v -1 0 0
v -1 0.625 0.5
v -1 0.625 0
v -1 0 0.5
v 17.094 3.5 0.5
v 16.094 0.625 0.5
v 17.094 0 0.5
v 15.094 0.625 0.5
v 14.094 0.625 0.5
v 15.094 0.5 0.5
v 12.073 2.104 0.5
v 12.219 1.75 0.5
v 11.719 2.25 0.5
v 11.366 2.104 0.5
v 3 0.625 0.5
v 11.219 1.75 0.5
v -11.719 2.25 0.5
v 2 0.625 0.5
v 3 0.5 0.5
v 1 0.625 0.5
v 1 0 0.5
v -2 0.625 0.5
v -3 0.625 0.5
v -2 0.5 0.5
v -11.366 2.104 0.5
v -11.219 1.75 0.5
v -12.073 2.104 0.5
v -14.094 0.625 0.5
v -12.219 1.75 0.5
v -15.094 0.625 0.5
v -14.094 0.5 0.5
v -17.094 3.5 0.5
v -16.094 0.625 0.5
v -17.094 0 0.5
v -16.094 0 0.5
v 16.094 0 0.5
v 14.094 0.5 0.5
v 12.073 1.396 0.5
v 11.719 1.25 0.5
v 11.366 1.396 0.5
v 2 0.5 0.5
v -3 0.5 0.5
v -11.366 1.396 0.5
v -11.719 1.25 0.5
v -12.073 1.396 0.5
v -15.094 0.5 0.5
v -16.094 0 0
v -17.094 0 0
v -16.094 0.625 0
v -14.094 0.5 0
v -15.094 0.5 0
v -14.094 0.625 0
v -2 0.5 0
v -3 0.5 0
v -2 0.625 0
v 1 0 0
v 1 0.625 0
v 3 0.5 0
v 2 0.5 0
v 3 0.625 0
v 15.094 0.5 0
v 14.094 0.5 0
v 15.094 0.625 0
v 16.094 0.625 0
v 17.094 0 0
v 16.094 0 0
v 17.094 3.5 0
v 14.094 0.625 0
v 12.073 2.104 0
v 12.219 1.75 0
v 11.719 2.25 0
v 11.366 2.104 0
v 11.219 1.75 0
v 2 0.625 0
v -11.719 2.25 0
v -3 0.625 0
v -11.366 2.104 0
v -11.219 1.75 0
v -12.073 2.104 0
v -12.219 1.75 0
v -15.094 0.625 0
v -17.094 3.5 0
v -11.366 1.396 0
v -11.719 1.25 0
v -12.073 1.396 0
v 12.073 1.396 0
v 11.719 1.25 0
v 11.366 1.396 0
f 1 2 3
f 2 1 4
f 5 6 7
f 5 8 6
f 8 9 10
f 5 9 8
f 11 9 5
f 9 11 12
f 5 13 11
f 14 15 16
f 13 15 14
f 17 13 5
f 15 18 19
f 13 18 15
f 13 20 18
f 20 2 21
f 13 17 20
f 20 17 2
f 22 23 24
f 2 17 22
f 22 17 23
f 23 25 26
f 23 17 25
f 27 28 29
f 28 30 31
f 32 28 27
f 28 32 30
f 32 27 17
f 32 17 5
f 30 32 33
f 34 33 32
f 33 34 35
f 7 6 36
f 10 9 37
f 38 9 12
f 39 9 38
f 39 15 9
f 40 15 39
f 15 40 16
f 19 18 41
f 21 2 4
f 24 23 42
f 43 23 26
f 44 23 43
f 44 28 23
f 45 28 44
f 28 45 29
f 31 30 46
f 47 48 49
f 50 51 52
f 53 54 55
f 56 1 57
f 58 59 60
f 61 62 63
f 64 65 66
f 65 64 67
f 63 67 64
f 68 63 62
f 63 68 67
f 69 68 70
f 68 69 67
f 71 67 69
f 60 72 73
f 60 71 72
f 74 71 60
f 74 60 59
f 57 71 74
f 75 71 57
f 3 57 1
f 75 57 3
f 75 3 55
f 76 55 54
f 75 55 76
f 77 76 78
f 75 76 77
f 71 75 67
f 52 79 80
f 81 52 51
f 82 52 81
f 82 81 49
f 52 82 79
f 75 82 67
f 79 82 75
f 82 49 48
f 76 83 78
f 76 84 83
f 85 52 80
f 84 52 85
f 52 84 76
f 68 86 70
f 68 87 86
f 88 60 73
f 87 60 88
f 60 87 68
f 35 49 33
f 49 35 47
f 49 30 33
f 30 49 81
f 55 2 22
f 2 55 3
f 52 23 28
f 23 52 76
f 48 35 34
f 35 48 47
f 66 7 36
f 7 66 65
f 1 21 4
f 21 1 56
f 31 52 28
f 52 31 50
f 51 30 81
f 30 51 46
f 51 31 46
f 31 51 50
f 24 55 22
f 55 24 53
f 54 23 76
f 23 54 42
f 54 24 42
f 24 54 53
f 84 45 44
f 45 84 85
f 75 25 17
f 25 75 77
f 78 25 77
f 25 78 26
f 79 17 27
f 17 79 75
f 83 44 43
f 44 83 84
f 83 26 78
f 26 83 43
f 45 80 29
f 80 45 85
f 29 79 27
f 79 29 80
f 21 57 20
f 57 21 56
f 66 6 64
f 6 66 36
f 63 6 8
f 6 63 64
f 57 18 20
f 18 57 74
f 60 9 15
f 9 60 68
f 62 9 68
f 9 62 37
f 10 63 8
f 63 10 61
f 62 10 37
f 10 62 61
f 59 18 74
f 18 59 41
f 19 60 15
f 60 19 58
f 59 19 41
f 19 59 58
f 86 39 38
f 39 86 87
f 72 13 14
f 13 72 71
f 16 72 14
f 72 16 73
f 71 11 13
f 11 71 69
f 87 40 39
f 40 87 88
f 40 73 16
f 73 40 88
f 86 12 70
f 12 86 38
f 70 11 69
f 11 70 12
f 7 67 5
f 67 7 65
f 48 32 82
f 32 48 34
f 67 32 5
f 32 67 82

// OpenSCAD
// file: modus.scad
//Corner Joint - allows the sides of two parts to create inlayed corner. Aids with welding.
//need to verify module math is the same throughout all parts.

module cornerjoint(Z,L,H,EndGap,PadL,PadH,CJangle,CJcenter){
    //change so that H = Z of inlayed part (usually 0.5)
    //add center and angle in degrees option, orgin far side of cut out area

     if((CJangle==0)&&(CJcenter==0))
      {    
        translate([0,0,0])
        rotate([0,0,CJangle])
        difference(){
        cube([L,H+PadH,Z]);
        translate([EndGap,H,0])
        cube([PadL,PadH,Z]);
        translate([L-EndGap-PadL,H,0])
        cube([PadL,PadH,Z]);}
      }    
else if((CJangle==90)&&(CJcenter==0))
      {    
        translate([H+PadH,0,0])
        rotate([0,0,CJangle])
        difference(){
        cube([L,H+PadH,Z]);
        translate([EndGap,H,0])
        cube([PadL,PadH,Z]);
        translate([L-EndGap-PadL,H,0])
        cube([PadL,PadH,Z]);}
      }
else if((CJangle==180)&&(CJcenter==0))       
      {    
        translate([L,H+PadH,0])
        rotate([0,0,CJangle])
        difference(){
        cube([L,H+PadH,Z]);
        translate([EndGap,H,0])
        cube([PadL,PadH,Z]);
        translate([L-EndGap-PadL,H,0])
        cube([PadL,PadH,Z]);}
      }
else if((CJangle==270)&&(CJcenter==0))
      {    
        translate([0,L,0])
        rotate([0,0,CJangle])
        difference(){
        cube([L,H+PadH,Z]);
        translate([EndGap,H,0])
        cube([PadL,PadH,Z]);
        translate([L-EndGap-PadL,H,0])
        cube([PadL,PadH,Z]);}
      }  
      
//centered     
   
else if((CJangle==0)&&(CJcenter==1))
      {    
        translate([-L/2,0,0])
        rotate([0,0,CJangle])
        difference(){
        cube([L,H+PadH,Z]);
        translate([EndGap,H,0])
        cube([PadL,PadH,Z]);
        translate([L-EndGap-PadL,H,0])
        cube([PadL,PadH,Z]);}
      }  
else if((CJangle==90)&&(CJcenter==1))
      {    
        translate([0,-L/2,0])
        rotate([0,0,CJangle])
        difference(){
        cube([L,H+PadH,Z]);
        translate([EndGap,H,0])
        cube([PadL,PadH,Z]);
        translate([L-EndGap-PadL,H,0])
        cube([PadL,PadH,Z]);}
      }
else if((CJangle==180)&&(CJcenter==1))       
      {    
        translate([L/2,0,0])
        rotate([0,0,CJangle])
        difference(){
        cube([L,H+PadH,Z]);
        translate([EndGap,H,0])
        cube([PadL,PadH,Z]);
        translate([L-EndGap-PadL,H,0])
        cube([PadL,PadH,Z]);}
      }
else if((CJangle==270)&&(CJcenter==1))
      {    
        translate([0,L/2,0])
        rotate([0,0,CJangle])
        difference(){
        cube([L,H+PadH,Z]);
        translate([EndGap,H,0])
        cube([PadL,PadH,Z]);
        translate([L-EndGap-PadL,H,0])
        cube([PadL,PadH,Z]);}
      }
} //end cornerjoint module

//Tab Insert - used to cut a hole for an abutting part to insert into. Typically aids with welding the two parts.
module tabinsert(X,Y,Z,dGap,cGap,c1,c2,c3,c4,c5,c6,c7,c8,center){
    translate([-dGap-(center*(X/2)),-dGap-(center*(Y/2)),0]){
        //main cut
        cube([X+(dGap*2),Y+(dGap*2),Z]);
        //corner c1c2
        translate([-cGap,(Y+(dGap*2))-c1+cGap,0])
            {
        cube([c2,c1,Z]);}
       //corner c3c4
       translate([(X+(dGap*2))-c3+cGap,(Y+(dGap*2))-c4+cGap,0]){
           cube([c3,c4,Z]);
       }
       //corner c5c6
       translate([(X+(dGap*2))-c6+cGap,-cGap,0])
      {
          cube([c6,c5,Z]);
      }
       
       //corner c7c8 
       translate([-cGap,-cGap,0]){
           cube([c7,c8,Z]);
       }
    
    } //end center translate
} //end tabinsert module
 

module nut(flattoflat,nutheight){  //distance from one flat side to the other flat side "A/F"

//typical sizes found here:
//https://en.wikipedia.org/wiki/Nut_(hardware)

difference(){
    translate([0,0,nutheight/2])
cube(size = [10,10,nutheight], center = true);
    
for(i=[1:6]){
    rotate([0,0,i*60])
difference(){
    translate([-10,0,0])
    cube([20,20,nutheight]);
    translate([-10,0,0])
    cube([20,flattoflat/2,nutheight]);
}  //end difference
}  //end for
}  //end differeence
}  //end module
// file: vars.scad
brickW=6; 
brickL=24;
brickCH=6; //Is brick height being shortened by d1z??

//3.625 x 2.25 x 8
//6 x 12 x 6

grateX=56;
grateY=23;
grateH=37; //Height mounted above press's frame
grateA=17.5; //angle of grate

//grateX=56;
//grateY=23;
//grateH=37; //Height mounted above press's frame
//grateA=17.5; //angle of grate


$fn=8; //defines resolution of circles. 8 is okay for review. 100  or greater should be used for for final dxf export.

dZstandard=0.5; //thickness of steel to be cut for drawer parts
fZstandard=0.5;
aZstandard=0.5; //thickness of steel to be cut for arm parts
hZstandard=0.125;

fBOLTHOLEstandardD=1; //standard bolts used on frame
aBOLTHOLEstandardD=1;

sliderodholeOD=1.2; 
d1bushingOD=1.25;
d1bushingL=1.25;
d1shaftOD=1;
d1bolt1OD=1;
d1bolt2OD=0.75;
d1nut2AF=1.25;
d1nut2H=0.665;


dGap=0.03125; //gap between a hole cut's edge and the part sitting within the hole. //D3 appears to use 0.3125, is this in error?

//all parts set to standard thickness below
//off standard preferences can be defined below

//drawer
drawergap=0.0283;  //extra room for drawer to slide in the space between f1 and f4
drawerHgap=0.1884;  //total extra space from drawer sides to frame walls. sum of both sides.

d2clevispinaccessholeOD=3;

d1z=dZstandard;
d2z=dZstandard;
d3z=dZstandard;
d4z=dZstandard;
d5z=dZstandard;
d6z=dZstandard;
d5z=dZstandard;
d7z=dZstandard;
d8z=dZstandard;
d9z=dZstandard;

d11z=dZstandard;
d12z=dZstandard;


//frame

f1y=6;
f1z=fZstandard;


f2y=3.5;
f2z=fZstandard;

f3y=3.5;
f3z=fZstandard;

f4y=11;
f4z=fZstandard;

f5y=3.5;
f5z=fZstandard;

f6y=8;
f6z=fZstandard;

f8y=brickW;
f8z=fZstandard;
f8boltD=1;

f9y=4.5;

f9z=fZstandard;




f12z=fZstandard;   

f11x=1.25;
f11z=fZstandard;

f13z=fZstandard;

f14y=3.5;
f14z=fZstandard;

//arms

a1x=4;
a1z=aZstandard;
a1out=24; //length from frame to A5 edge for bricks to sit on as they exit

a2x=6;
a2z=aZstandard;

a3x=4;
a3y=72;
a3z=aZstandard;

a4x=6;
a4y=72;
a4z=aZstandard;

a5x=6;
a5y=72;
a5z=aZstandard;

a6z=aZstandard;

//guards

h1x=grateX;
h1y=grateH;  //might need to tweak for grate thickness

h1z=hZstandard;
h2z=hZstandard;
h3z=hZstandard;
h4z=hZstandard;
h5z=hZstandard;
h6z=hZstandard;
h7z=hZstandard;
h8z=hZstandard;

//
//Input your main cylinder's dimenions here
//
cylMainBore = 5;
cylMainStroke = 16;
cylMainExt = 43;
cylMainRet = 27;
cylMainA = (cylMainRet-cylMainStroke); //center to center minus stroke length
cylMainB = 0.25; // cylinder wall thickness
cylMainD = 2.5; //Rod OD
cylMainE = 5.75; //rear pin holder width
cylMainG = 4; //rod pin holder width
cylMainJ = 3.8; //distance from the end of the cylinder body to rod pin center
cylMainR = 1.52; //pin hole ID
cylMainS = 2.5; //pin holder OD

//
//Input your drawer cylinder's dimenions here
//
//
cylDrawerBore = 5;
cylDrawerStroke = 16;
cylDrawerExt = 43;
cylDrawerRet = 27;
cylDrawerA = (cylMainRet-cylMainStroke); //center to center minus stroke length
cylDrawerB = 0.25; // cylinder wall thickness
cylDrawerD = 2.5; //Rod OD
cylDrawerE = 5.75; //rear pin holder width
cylDrawerG = 4; //rod pin holder width
cylDrawerJ = 3.8; //distance from the end of the cylinder body to rod pin center
cylDrawerR = 1.52; //pin hole ID
cylDrawerS = 2.5; //pin holder OD

cylinderDRAWERbodyH=3; //measured when in position, largest length from top to bottom of cylinder
cylinderDRAWERminC2C=0; //drawer's hydraulic cylinder's distance from the center of one mounting hole to the center of the other when fully compressed.
cylinderDRAWERmaxC2C=0; ///drawer's hydraulic cylinder's distance from the center of one mounting hole to the center of the other when fully extended.
cylinderDRAWERrodclevisW=2.5; //width of cylinders' clevis on end of rod
cylinderDRAWERrodclevisID=1;
cylinderDRAWERrodclevisOD=2;
cylinderDRAWERrearclevisW=2.5; //width of mounting clevis cylinder body
cylinderDRAWERrearclevisID=1;
cylinderDRAWERrearclevisOD=2;
cylinderDRAWERrearclevisClearance=3; //usable space around rear clevis pin (in diameter). be aware of hyraulic fittings.

//the following variables are calculated in order of dependence on preceding variables

d3x=brickL+(d2z*2);
d3y=brickCH-d1z;
d4x=brickW+d3z+d3z;
d4y=brickCH-d1z;
d5x=brickL+(d2z*2);
d5y=brickW;
d6x=brickL+(d2z*2);
d6y=brickCH;
d7x=cylinderDRAWERrearclevisClearance;
d7y=a4z+d8z+cylinderDRAWERbodyH;
d9x=cylinderDRAWERbodyH+d6z; //should be based on clevis size?
d9y=cylinderDRAWERbodyH+d8z;
d8x=brickL+(d2z*2);
d8y=max(5,(d9x-d6z));   //need to review fundamentals, 5 minimun unless d9 gets larger than d8
d11x=1.5+(d1bolt1OD*2)+d1bushingOD;
d11y=max((0.5+d1bushingL),4);

d12x=d8x;
d12y=d11y+1;

f1x=((brickL+(d2z*2)+drawerHgap+(f9y*2)));
f3x=f1x;

d1x=(brickL+d2z+d2z);
//d1x=(((f1x/2)-(((brickL+(d2z*2)+drawerHgap)/2)-fZstandard-(sliderodholeOD/2)))+(d11x/2))*2;
d1y=((brickW+d3z+d3z)*3)+1;

d2x=d8y+d6z+brickW+d3z+d5y+d3z;
d2y=brickCH;



f11y=f8y;
f6x=brickL+(d2z*2)+(f9y*2)+drawerHgap;

f9x=(f2z+((cylMainS+0.125)/2)+cylMainRet-cylMainJ+1+f4y+drawergap+d2y+f1y);  //leaves 1" between top of cylinder and bottom of F4
f8x=f9x;


f2x=brickL+(d2z*2)+drawerHgap+(f9y*2)-(1.4*2);  //distance between large cut outs in f9

f5x=brickL+(d2z*2)+drawerHgap+(f9y*2)+(a1x*2); //distance between outer edges of each A1

f4x=f5x-0.5;   //same as f5 but minus 0.25 on each side to give a little overhang

f14x=brickL+(1*2)+(.125*2)+(dGap*2); 

f12x=f3x;
f12y=(f3y*2)+brickW;

sliderodoffset=(((brickL+(d2z*2)+drawerHgap)/2)-fZstandard-(sliderodholeOD/2));

distancetof8center=(cylDrawerExt+(a4x/2)+((d9x-d6z)/2)+d6z+(brickW/2)); //F8 center on A1

a1y=distancetof8center+(brickW/2)+a1out;
a2y=a1y;

h7x=f5x-((a1x/2)*2)+(1.5*2);
h7y=cylDrawerStroke;

h8x=f5x-((a1x/2)*2)+(1.5*2);
h8y=a1out-a5x-f5y;  //distance between a5 and f5

hopperBaseX=brickL;
hopperBaseY=brickW;

h2x=grateX;
h2y=sqrt(((h1y-(sin(grateA)*grateY))*(h1y-(sin(grateA)*grateY)))+(((cos(grateA)*grateY)-hopperBaseY)*((cos(grateA)*grateY)-hopperBaseY)));

//h1y-(sin(grateA)*grateY)
//(cos(grateA)*grateY)-hopperBaseY

echo(h1y-(sin(grateA)*grateY));
echo((cos(grateA)*grateY)-hopperBaseY);
echo(h2y);
echo(atan((h1y-(sin(grateA)*grateY))/((cos(grateA)*grateY)-hopperBaseY)));
echo((h1y-(sin(grateA)*grateY))/(h1y));

// ECHO - REQUIRED PARTS BASED ON INPUTS

echo(str("Minimum drawer cylinder stroke length: ",(d3z*2)+d5y+brickW));
//would be cool to validate and confirm user inputed stroke length. set error=1; if drawer cylinder is not long enough. print an echo warning.

echo(str("Grate hieght above ground level: ",(1)));
// main file
include <vars.scad>;
use <modus.scad>;

f3p();

module f3p(){

difference(){
translate([-(f3x/2),0,0])
cube([f3x,f3y,f3z]);
translate([-(f3x/2),0,0])
cuts();
translate([(f3x/2),0,0])
mirror([1,0,0])
cuts();
} //end difference
module cuts(){
    translate([1,0,0])
        cornerjoint(f3z,(f3x-4)/2,f1z,1,1,0.125,0,0);
    translate([5.375,f3y/2,0])
        cylinder(h = f3z, r = 0.5);      
} //end cuts module

} //end f3p module
